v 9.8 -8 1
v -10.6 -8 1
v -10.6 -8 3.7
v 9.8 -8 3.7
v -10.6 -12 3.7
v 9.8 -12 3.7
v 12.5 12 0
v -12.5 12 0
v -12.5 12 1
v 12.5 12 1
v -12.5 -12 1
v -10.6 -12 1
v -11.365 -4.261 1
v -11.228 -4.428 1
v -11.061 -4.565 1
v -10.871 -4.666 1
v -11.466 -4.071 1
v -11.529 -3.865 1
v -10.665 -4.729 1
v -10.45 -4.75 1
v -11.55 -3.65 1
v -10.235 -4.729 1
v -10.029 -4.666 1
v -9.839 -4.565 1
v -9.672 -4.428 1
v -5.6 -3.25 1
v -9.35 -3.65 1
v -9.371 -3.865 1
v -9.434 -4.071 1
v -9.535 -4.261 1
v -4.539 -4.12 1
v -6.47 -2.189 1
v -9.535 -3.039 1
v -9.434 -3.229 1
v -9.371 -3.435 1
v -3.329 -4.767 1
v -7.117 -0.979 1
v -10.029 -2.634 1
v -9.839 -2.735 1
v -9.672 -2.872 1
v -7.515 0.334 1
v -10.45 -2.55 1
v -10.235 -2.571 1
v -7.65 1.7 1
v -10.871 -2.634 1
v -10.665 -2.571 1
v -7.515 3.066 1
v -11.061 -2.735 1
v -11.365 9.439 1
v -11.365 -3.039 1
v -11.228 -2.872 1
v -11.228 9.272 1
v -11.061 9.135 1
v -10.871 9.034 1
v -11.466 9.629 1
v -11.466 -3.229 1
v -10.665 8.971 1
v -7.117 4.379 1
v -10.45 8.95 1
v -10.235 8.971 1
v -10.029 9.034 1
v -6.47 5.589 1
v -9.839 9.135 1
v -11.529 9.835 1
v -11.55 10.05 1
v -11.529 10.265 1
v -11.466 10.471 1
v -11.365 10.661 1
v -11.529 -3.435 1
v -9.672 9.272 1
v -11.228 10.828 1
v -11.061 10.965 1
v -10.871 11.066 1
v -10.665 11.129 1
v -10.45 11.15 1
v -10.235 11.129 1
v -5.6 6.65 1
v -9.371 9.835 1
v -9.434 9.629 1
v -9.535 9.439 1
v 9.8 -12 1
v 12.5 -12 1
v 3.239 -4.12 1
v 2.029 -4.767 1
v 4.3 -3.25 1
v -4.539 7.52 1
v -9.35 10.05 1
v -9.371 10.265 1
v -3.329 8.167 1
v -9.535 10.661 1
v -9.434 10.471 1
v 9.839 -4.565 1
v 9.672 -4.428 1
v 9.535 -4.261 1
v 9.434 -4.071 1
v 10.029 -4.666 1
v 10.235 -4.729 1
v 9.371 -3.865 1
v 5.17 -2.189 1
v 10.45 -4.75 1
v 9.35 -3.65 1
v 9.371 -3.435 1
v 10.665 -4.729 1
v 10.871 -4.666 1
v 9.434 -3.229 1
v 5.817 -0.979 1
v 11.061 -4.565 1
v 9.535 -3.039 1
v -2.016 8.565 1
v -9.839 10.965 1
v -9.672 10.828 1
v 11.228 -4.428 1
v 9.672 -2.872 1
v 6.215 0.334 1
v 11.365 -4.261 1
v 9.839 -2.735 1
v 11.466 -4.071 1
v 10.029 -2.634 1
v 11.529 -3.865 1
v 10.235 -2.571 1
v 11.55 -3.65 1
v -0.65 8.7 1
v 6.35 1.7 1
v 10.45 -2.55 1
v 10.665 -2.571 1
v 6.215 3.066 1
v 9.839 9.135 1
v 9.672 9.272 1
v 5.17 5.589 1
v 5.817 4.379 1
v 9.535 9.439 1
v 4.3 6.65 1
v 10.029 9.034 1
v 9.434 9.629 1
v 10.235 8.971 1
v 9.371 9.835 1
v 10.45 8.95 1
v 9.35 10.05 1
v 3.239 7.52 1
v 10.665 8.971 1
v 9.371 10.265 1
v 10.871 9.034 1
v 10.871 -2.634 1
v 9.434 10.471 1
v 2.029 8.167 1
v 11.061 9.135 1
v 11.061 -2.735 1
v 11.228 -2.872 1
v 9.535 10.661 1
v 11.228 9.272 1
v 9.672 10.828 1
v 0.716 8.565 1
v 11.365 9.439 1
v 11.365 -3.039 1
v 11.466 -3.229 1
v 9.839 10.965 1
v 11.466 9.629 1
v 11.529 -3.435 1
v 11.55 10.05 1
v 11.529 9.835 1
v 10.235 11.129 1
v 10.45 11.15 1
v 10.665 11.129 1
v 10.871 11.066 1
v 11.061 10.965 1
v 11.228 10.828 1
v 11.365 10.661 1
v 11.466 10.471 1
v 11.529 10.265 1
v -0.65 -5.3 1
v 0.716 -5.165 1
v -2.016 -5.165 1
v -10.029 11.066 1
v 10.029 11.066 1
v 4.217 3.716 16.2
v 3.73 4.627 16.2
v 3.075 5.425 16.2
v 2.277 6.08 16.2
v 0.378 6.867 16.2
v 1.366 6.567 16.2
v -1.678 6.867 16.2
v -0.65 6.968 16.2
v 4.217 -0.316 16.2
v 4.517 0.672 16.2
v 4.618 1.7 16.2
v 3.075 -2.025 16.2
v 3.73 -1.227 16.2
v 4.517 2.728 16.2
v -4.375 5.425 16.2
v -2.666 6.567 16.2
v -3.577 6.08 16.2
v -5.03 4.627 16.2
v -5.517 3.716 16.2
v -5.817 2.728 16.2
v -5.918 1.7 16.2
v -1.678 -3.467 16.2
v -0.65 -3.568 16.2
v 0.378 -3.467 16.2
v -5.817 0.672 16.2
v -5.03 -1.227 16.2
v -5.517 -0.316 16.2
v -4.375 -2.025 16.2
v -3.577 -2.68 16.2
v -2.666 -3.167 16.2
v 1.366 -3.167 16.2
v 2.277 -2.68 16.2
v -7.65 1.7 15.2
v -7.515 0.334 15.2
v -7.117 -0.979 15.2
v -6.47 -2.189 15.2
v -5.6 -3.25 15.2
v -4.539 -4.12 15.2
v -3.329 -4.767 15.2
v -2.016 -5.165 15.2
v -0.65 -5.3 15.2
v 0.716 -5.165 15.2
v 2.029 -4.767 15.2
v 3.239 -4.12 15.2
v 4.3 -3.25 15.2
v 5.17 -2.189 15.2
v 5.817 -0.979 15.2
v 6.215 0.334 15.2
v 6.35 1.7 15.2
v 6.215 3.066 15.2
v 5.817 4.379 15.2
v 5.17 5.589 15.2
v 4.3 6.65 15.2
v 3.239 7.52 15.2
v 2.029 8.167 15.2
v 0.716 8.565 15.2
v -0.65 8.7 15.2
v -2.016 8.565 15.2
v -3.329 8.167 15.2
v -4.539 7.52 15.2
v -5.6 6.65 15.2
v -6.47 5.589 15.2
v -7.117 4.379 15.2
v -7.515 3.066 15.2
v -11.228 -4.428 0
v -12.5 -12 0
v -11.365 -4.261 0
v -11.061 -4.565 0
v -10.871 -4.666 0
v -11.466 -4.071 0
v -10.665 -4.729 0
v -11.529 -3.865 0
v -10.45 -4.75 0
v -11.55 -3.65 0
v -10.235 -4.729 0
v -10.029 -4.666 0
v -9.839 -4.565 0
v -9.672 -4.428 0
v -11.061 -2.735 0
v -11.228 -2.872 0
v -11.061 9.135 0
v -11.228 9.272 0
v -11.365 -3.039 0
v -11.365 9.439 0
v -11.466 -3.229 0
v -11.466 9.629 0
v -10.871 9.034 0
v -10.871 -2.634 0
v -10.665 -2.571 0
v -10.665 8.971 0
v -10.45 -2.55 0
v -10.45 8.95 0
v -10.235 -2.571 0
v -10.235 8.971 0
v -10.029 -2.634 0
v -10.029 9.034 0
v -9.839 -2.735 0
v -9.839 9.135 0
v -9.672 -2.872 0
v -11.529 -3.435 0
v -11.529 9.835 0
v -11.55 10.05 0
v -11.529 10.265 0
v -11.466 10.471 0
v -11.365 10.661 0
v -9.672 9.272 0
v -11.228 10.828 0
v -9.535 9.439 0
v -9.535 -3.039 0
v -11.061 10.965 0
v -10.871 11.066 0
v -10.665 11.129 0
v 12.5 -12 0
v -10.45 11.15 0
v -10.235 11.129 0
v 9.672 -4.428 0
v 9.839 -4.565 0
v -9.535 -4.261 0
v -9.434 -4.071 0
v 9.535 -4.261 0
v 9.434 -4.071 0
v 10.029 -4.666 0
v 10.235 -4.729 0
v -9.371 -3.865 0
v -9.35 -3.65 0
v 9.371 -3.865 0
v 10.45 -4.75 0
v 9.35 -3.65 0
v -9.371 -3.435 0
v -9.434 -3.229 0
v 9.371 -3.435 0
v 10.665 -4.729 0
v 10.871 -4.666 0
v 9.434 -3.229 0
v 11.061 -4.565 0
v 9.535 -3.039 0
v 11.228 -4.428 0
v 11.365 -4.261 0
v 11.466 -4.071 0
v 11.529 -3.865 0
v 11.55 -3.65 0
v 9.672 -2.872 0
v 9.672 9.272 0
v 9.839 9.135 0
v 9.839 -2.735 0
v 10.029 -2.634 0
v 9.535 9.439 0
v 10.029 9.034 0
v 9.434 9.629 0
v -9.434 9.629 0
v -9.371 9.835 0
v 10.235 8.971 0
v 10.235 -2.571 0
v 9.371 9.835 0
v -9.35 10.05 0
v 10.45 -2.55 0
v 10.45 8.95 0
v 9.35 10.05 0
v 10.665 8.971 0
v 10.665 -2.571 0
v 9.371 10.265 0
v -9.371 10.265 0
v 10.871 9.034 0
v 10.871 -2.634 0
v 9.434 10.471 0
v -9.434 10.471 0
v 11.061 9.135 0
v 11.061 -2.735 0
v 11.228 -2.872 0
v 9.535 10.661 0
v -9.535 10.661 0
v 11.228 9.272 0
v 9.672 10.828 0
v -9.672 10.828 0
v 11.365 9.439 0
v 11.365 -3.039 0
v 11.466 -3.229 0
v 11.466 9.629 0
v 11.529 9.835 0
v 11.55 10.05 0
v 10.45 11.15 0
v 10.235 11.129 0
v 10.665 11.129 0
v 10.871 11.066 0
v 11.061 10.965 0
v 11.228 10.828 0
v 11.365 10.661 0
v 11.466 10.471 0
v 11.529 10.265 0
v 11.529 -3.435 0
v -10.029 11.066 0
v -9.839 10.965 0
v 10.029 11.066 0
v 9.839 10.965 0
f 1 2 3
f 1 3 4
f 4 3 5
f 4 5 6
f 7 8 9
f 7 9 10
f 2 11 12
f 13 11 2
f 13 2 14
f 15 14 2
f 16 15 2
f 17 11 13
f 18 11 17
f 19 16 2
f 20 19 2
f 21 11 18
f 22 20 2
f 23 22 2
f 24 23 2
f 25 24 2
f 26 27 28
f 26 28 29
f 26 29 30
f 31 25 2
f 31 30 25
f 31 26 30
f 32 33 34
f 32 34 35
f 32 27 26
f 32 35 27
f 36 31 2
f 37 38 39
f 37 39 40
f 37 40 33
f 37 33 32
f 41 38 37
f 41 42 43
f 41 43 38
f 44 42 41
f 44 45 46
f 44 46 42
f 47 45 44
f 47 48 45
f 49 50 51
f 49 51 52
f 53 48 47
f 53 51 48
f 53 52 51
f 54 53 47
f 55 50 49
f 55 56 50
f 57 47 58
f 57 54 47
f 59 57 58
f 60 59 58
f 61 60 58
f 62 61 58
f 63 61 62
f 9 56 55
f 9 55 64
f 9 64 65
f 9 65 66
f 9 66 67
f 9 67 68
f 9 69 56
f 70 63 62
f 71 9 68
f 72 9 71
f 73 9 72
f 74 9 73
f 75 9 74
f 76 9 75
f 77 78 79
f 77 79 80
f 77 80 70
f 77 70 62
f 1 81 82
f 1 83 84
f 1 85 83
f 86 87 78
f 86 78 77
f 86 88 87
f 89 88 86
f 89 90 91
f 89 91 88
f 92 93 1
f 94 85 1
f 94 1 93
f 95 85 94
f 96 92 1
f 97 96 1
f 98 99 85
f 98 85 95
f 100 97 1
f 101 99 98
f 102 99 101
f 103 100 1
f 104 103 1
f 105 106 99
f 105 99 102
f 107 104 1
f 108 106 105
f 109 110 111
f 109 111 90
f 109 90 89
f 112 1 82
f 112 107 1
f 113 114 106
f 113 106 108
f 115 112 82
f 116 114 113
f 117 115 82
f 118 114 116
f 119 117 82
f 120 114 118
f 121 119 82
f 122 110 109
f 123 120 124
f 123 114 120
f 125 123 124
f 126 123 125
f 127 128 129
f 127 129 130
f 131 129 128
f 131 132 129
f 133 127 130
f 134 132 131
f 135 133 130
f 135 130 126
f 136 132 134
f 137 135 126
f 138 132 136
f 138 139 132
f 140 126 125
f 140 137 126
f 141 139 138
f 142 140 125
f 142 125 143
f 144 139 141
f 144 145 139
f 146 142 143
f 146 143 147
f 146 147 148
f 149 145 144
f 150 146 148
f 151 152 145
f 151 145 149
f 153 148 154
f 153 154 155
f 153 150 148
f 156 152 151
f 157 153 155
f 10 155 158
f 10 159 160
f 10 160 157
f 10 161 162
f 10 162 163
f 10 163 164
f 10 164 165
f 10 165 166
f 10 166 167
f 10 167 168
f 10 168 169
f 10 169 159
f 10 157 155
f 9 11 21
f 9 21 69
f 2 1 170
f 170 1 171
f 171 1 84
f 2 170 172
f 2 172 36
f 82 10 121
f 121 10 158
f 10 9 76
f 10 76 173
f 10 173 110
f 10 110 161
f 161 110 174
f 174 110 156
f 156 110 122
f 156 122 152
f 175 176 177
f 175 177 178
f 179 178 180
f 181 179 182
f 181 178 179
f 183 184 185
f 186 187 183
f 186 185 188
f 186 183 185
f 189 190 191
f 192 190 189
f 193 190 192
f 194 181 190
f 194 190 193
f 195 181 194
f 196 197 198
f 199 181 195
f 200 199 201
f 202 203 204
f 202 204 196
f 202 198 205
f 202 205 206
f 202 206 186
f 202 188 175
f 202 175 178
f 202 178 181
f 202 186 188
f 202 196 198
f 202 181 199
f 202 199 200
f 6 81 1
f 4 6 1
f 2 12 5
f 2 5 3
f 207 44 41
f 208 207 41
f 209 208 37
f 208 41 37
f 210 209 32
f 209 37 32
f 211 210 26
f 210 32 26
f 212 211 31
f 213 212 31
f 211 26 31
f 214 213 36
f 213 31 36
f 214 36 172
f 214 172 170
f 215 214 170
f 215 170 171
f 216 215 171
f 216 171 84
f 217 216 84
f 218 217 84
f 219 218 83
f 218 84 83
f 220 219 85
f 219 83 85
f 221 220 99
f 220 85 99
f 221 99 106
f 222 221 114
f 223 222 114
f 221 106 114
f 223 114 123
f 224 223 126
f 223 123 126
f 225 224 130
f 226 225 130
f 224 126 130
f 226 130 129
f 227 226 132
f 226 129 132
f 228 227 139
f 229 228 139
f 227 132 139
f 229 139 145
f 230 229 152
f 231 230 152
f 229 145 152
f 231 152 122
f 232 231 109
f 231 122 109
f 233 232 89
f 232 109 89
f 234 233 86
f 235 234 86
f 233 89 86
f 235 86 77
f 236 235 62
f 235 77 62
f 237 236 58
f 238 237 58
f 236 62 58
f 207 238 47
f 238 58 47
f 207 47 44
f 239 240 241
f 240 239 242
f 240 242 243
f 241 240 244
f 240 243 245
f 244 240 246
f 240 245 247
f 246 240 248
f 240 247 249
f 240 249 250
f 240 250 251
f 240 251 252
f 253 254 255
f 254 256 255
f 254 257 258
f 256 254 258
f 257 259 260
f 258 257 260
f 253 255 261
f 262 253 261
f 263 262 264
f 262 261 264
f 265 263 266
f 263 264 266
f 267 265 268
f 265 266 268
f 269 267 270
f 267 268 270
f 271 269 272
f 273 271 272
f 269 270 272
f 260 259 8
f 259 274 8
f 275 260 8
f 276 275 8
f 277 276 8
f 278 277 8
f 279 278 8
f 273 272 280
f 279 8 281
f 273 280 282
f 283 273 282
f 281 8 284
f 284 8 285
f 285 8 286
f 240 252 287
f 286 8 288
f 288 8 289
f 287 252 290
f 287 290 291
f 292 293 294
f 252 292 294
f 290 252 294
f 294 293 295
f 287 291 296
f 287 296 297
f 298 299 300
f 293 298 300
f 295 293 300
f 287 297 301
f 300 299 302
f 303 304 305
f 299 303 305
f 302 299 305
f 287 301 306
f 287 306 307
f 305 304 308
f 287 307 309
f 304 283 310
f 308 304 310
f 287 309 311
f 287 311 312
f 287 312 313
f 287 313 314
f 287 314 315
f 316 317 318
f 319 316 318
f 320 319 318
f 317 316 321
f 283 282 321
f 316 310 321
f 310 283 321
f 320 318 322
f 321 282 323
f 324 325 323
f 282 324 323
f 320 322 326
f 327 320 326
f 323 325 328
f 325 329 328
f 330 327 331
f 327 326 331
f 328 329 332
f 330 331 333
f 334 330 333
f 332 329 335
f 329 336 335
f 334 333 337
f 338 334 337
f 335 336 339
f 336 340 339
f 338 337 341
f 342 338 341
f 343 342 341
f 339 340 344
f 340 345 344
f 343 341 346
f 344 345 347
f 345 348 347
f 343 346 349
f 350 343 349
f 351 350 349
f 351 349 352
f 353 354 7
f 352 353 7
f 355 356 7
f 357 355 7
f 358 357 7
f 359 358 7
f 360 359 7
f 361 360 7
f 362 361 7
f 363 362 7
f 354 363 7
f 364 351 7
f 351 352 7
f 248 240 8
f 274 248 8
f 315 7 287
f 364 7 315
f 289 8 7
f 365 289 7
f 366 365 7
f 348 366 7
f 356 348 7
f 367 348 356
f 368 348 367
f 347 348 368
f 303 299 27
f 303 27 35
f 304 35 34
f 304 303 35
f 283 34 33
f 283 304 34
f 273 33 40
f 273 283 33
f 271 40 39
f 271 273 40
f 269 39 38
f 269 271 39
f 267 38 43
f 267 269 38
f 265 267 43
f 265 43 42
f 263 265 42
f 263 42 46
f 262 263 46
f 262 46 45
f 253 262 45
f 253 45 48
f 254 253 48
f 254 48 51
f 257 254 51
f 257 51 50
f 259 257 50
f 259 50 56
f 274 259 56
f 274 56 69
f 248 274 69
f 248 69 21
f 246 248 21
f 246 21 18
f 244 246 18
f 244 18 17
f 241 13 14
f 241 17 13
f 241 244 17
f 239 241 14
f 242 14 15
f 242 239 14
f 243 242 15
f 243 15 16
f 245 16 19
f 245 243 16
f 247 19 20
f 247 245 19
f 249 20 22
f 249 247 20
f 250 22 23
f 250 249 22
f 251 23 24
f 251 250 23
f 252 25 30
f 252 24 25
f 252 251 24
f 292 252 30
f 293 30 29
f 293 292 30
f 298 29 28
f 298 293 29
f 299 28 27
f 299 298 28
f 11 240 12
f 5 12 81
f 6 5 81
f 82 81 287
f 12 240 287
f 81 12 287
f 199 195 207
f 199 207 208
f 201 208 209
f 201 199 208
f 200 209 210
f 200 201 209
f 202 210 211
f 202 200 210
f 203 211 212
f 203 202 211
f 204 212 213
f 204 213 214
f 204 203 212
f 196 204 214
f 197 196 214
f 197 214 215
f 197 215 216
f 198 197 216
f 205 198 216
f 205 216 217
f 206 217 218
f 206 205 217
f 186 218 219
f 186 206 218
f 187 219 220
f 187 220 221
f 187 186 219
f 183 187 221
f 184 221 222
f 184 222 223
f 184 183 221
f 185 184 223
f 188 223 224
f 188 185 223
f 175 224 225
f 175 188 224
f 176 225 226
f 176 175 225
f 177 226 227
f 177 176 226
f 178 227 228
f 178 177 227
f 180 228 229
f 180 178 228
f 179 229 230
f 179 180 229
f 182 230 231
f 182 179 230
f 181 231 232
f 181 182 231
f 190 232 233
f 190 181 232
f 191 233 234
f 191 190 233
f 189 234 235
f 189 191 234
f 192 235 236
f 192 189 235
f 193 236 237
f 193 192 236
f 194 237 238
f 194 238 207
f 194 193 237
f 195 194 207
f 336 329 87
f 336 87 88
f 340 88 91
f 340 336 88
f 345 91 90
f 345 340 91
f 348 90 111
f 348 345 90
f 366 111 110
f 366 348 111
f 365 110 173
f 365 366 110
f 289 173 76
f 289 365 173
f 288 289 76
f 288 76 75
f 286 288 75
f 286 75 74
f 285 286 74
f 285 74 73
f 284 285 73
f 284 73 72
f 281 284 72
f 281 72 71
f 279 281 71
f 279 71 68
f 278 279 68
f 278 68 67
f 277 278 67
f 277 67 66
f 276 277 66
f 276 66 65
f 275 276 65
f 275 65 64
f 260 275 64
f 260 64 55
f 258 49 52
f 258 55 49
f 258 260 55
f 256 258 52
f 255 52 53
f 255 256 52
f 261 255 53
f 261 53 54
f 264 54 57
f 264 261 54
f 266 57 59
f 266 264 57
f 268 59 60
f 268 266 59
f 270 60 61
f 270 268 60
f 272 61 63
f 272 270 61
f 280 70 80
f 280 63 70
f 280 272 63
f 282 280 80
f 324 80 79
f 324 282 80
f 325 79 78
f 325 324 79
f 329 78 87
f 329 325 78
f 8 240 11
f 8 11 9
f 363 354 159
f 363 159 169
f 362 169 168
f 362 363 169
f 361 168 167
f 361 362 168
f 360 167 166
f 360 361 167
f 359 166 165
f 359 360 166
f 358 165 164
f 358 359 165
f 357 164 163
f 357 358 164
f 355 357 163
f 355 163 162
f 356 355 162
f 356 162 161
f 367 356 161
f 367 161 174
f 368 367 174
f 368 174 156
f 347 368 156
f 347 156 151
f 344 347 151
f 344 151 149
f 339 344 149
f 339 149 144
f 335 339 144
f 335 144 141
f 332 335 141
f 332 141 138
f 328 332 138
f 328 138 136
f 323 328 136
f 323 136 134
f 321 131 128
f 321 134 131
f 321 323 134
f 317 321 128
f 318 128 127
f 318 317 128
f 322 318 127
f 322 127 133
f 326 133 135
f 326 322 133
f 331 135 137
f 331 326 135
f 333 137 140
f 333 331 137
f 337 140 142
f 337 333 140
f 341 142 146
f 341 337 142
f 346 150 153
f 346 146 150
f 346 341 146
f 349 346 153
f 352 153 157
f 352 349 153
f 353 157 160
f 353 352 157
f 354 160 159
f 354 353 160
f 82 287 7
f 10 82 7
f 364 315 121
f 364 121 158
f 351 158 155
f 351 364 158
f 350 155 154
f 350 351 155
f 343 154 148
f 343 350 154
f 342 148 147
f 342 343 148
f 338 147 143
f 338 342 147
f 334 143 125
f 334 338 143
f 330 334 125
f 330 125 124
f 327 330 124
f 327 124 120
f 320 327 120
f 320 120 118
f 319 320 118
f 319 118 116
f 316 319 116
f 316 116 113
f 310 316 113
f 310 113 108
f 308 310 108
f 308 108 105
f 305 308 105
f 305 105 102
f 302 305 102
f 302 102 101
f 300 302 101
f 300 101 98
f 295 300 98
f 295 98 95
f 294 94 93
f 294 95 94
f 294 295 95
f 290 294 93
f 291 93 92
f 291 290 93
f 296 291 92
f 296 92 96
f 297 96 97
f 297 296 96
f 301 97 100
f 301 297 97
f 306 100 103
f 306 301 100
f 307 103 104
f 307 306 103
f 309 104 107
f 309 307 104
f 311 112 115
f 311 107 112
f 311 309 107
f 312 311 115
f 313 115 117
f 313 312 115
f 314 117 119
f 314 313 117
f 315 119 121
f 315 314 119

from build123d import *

# Parameters (mm, degrees)
ESBO_O1_W                  = 25
ESBO_O1_H                  = 24
RESSALTO_EXTRUS_O1_DEPTH   = 1
ESBO_O2_W                  = 20.4
ESBO_O2_H                  = 4
RESSALTO_EXTRUS_O2_DEPTH   = 2.7
CORTE_EXTRUS_O1_DEPTH      = 18.536818412
CORTE_EXTRUS_O1_DEPTH_BACK = 18.536818412
ESBO_O3_R                  = 1.1
ESBO_O4_R                  = 7
RESSALTO_EXTRUS_O3_DEPTH   = 15.2
CHANFRO1_SIZE              = 1
CHANFRO1_SIZE2             = 1.732050808


with BuildPart() as part:
    # Esboço1 → Ressalto-extrusão1 (new body)
    with BuildSketch(Plane.XY):
        Rectangle(ESBO_O1_W, ESBO_O1_H)
    extrude(amount=RESSALTO_EXTRUS_O1_DEPTH)

    # Esboço2 → Ressalto-extrusão2 (add)
    with BuildSketch(Plane.XY.offset(1)):
        with Locations((-0.4, -10)):
            Rectangle(ESBO_O2_W, ESBO_O2_H)
    extrude(amount=RESSALTO_EXTRUS_O2_DEPTH)

    # Esboço3 → Corte-extrusão1 (cut, two sides: drawn at the far end of the back side and taken through both)
    with BuildSketch(Plane.XY.offset(1).offset(-CORTE_EXTRUS_O1_DEPTH_BACK)):
        with Locations((10.45, 10.05)):
            Circle(ESBO_O3_R)
        with Locations((-10.45, 10.05)):
            Circle(ESBO_O3_R)
        with Locations((10.45, -3.65)):
            Circle(ESBO_O3_R)
        with Locations((-10.45, -3.65)):
            Circle(ESBO_O3_R)
    extrude(amount=CORTE_EXTRUS_O1_DEPTH + CORTE_EXTRUS_O1_DEPTH_BACK, mode=Mode.SUBTRACT)

    # Esboço4 → Ressalto-extrusão3 (add)
    with BuildSketch(Plane.XY.offset(1)):
        with Locations(Location((-0.65, 1.7, 0), (0, 0, 180))):
            Circle(ESBO_O4_R)
    extrude(amount=RESSALTO_EXTRUS_O3_DEPTH)

    # Chanfro1
    chanfro1_edges = [part.edges().sort_by_distance(p)[0] for p in [
        (6.35, 1.7, 16.2),
    ]]
    chanfro1_side = [part.faces().sort_by_distance(p)[0] for p in [
        (6.35, 1.7, 8.6),
    ]]
    chamfer(chanfro1_edges, length=CHANFRO1_SIZE, length2=CHANFRO1_SIZE2, reference=chanfro1_side[0])


solid = part.part
